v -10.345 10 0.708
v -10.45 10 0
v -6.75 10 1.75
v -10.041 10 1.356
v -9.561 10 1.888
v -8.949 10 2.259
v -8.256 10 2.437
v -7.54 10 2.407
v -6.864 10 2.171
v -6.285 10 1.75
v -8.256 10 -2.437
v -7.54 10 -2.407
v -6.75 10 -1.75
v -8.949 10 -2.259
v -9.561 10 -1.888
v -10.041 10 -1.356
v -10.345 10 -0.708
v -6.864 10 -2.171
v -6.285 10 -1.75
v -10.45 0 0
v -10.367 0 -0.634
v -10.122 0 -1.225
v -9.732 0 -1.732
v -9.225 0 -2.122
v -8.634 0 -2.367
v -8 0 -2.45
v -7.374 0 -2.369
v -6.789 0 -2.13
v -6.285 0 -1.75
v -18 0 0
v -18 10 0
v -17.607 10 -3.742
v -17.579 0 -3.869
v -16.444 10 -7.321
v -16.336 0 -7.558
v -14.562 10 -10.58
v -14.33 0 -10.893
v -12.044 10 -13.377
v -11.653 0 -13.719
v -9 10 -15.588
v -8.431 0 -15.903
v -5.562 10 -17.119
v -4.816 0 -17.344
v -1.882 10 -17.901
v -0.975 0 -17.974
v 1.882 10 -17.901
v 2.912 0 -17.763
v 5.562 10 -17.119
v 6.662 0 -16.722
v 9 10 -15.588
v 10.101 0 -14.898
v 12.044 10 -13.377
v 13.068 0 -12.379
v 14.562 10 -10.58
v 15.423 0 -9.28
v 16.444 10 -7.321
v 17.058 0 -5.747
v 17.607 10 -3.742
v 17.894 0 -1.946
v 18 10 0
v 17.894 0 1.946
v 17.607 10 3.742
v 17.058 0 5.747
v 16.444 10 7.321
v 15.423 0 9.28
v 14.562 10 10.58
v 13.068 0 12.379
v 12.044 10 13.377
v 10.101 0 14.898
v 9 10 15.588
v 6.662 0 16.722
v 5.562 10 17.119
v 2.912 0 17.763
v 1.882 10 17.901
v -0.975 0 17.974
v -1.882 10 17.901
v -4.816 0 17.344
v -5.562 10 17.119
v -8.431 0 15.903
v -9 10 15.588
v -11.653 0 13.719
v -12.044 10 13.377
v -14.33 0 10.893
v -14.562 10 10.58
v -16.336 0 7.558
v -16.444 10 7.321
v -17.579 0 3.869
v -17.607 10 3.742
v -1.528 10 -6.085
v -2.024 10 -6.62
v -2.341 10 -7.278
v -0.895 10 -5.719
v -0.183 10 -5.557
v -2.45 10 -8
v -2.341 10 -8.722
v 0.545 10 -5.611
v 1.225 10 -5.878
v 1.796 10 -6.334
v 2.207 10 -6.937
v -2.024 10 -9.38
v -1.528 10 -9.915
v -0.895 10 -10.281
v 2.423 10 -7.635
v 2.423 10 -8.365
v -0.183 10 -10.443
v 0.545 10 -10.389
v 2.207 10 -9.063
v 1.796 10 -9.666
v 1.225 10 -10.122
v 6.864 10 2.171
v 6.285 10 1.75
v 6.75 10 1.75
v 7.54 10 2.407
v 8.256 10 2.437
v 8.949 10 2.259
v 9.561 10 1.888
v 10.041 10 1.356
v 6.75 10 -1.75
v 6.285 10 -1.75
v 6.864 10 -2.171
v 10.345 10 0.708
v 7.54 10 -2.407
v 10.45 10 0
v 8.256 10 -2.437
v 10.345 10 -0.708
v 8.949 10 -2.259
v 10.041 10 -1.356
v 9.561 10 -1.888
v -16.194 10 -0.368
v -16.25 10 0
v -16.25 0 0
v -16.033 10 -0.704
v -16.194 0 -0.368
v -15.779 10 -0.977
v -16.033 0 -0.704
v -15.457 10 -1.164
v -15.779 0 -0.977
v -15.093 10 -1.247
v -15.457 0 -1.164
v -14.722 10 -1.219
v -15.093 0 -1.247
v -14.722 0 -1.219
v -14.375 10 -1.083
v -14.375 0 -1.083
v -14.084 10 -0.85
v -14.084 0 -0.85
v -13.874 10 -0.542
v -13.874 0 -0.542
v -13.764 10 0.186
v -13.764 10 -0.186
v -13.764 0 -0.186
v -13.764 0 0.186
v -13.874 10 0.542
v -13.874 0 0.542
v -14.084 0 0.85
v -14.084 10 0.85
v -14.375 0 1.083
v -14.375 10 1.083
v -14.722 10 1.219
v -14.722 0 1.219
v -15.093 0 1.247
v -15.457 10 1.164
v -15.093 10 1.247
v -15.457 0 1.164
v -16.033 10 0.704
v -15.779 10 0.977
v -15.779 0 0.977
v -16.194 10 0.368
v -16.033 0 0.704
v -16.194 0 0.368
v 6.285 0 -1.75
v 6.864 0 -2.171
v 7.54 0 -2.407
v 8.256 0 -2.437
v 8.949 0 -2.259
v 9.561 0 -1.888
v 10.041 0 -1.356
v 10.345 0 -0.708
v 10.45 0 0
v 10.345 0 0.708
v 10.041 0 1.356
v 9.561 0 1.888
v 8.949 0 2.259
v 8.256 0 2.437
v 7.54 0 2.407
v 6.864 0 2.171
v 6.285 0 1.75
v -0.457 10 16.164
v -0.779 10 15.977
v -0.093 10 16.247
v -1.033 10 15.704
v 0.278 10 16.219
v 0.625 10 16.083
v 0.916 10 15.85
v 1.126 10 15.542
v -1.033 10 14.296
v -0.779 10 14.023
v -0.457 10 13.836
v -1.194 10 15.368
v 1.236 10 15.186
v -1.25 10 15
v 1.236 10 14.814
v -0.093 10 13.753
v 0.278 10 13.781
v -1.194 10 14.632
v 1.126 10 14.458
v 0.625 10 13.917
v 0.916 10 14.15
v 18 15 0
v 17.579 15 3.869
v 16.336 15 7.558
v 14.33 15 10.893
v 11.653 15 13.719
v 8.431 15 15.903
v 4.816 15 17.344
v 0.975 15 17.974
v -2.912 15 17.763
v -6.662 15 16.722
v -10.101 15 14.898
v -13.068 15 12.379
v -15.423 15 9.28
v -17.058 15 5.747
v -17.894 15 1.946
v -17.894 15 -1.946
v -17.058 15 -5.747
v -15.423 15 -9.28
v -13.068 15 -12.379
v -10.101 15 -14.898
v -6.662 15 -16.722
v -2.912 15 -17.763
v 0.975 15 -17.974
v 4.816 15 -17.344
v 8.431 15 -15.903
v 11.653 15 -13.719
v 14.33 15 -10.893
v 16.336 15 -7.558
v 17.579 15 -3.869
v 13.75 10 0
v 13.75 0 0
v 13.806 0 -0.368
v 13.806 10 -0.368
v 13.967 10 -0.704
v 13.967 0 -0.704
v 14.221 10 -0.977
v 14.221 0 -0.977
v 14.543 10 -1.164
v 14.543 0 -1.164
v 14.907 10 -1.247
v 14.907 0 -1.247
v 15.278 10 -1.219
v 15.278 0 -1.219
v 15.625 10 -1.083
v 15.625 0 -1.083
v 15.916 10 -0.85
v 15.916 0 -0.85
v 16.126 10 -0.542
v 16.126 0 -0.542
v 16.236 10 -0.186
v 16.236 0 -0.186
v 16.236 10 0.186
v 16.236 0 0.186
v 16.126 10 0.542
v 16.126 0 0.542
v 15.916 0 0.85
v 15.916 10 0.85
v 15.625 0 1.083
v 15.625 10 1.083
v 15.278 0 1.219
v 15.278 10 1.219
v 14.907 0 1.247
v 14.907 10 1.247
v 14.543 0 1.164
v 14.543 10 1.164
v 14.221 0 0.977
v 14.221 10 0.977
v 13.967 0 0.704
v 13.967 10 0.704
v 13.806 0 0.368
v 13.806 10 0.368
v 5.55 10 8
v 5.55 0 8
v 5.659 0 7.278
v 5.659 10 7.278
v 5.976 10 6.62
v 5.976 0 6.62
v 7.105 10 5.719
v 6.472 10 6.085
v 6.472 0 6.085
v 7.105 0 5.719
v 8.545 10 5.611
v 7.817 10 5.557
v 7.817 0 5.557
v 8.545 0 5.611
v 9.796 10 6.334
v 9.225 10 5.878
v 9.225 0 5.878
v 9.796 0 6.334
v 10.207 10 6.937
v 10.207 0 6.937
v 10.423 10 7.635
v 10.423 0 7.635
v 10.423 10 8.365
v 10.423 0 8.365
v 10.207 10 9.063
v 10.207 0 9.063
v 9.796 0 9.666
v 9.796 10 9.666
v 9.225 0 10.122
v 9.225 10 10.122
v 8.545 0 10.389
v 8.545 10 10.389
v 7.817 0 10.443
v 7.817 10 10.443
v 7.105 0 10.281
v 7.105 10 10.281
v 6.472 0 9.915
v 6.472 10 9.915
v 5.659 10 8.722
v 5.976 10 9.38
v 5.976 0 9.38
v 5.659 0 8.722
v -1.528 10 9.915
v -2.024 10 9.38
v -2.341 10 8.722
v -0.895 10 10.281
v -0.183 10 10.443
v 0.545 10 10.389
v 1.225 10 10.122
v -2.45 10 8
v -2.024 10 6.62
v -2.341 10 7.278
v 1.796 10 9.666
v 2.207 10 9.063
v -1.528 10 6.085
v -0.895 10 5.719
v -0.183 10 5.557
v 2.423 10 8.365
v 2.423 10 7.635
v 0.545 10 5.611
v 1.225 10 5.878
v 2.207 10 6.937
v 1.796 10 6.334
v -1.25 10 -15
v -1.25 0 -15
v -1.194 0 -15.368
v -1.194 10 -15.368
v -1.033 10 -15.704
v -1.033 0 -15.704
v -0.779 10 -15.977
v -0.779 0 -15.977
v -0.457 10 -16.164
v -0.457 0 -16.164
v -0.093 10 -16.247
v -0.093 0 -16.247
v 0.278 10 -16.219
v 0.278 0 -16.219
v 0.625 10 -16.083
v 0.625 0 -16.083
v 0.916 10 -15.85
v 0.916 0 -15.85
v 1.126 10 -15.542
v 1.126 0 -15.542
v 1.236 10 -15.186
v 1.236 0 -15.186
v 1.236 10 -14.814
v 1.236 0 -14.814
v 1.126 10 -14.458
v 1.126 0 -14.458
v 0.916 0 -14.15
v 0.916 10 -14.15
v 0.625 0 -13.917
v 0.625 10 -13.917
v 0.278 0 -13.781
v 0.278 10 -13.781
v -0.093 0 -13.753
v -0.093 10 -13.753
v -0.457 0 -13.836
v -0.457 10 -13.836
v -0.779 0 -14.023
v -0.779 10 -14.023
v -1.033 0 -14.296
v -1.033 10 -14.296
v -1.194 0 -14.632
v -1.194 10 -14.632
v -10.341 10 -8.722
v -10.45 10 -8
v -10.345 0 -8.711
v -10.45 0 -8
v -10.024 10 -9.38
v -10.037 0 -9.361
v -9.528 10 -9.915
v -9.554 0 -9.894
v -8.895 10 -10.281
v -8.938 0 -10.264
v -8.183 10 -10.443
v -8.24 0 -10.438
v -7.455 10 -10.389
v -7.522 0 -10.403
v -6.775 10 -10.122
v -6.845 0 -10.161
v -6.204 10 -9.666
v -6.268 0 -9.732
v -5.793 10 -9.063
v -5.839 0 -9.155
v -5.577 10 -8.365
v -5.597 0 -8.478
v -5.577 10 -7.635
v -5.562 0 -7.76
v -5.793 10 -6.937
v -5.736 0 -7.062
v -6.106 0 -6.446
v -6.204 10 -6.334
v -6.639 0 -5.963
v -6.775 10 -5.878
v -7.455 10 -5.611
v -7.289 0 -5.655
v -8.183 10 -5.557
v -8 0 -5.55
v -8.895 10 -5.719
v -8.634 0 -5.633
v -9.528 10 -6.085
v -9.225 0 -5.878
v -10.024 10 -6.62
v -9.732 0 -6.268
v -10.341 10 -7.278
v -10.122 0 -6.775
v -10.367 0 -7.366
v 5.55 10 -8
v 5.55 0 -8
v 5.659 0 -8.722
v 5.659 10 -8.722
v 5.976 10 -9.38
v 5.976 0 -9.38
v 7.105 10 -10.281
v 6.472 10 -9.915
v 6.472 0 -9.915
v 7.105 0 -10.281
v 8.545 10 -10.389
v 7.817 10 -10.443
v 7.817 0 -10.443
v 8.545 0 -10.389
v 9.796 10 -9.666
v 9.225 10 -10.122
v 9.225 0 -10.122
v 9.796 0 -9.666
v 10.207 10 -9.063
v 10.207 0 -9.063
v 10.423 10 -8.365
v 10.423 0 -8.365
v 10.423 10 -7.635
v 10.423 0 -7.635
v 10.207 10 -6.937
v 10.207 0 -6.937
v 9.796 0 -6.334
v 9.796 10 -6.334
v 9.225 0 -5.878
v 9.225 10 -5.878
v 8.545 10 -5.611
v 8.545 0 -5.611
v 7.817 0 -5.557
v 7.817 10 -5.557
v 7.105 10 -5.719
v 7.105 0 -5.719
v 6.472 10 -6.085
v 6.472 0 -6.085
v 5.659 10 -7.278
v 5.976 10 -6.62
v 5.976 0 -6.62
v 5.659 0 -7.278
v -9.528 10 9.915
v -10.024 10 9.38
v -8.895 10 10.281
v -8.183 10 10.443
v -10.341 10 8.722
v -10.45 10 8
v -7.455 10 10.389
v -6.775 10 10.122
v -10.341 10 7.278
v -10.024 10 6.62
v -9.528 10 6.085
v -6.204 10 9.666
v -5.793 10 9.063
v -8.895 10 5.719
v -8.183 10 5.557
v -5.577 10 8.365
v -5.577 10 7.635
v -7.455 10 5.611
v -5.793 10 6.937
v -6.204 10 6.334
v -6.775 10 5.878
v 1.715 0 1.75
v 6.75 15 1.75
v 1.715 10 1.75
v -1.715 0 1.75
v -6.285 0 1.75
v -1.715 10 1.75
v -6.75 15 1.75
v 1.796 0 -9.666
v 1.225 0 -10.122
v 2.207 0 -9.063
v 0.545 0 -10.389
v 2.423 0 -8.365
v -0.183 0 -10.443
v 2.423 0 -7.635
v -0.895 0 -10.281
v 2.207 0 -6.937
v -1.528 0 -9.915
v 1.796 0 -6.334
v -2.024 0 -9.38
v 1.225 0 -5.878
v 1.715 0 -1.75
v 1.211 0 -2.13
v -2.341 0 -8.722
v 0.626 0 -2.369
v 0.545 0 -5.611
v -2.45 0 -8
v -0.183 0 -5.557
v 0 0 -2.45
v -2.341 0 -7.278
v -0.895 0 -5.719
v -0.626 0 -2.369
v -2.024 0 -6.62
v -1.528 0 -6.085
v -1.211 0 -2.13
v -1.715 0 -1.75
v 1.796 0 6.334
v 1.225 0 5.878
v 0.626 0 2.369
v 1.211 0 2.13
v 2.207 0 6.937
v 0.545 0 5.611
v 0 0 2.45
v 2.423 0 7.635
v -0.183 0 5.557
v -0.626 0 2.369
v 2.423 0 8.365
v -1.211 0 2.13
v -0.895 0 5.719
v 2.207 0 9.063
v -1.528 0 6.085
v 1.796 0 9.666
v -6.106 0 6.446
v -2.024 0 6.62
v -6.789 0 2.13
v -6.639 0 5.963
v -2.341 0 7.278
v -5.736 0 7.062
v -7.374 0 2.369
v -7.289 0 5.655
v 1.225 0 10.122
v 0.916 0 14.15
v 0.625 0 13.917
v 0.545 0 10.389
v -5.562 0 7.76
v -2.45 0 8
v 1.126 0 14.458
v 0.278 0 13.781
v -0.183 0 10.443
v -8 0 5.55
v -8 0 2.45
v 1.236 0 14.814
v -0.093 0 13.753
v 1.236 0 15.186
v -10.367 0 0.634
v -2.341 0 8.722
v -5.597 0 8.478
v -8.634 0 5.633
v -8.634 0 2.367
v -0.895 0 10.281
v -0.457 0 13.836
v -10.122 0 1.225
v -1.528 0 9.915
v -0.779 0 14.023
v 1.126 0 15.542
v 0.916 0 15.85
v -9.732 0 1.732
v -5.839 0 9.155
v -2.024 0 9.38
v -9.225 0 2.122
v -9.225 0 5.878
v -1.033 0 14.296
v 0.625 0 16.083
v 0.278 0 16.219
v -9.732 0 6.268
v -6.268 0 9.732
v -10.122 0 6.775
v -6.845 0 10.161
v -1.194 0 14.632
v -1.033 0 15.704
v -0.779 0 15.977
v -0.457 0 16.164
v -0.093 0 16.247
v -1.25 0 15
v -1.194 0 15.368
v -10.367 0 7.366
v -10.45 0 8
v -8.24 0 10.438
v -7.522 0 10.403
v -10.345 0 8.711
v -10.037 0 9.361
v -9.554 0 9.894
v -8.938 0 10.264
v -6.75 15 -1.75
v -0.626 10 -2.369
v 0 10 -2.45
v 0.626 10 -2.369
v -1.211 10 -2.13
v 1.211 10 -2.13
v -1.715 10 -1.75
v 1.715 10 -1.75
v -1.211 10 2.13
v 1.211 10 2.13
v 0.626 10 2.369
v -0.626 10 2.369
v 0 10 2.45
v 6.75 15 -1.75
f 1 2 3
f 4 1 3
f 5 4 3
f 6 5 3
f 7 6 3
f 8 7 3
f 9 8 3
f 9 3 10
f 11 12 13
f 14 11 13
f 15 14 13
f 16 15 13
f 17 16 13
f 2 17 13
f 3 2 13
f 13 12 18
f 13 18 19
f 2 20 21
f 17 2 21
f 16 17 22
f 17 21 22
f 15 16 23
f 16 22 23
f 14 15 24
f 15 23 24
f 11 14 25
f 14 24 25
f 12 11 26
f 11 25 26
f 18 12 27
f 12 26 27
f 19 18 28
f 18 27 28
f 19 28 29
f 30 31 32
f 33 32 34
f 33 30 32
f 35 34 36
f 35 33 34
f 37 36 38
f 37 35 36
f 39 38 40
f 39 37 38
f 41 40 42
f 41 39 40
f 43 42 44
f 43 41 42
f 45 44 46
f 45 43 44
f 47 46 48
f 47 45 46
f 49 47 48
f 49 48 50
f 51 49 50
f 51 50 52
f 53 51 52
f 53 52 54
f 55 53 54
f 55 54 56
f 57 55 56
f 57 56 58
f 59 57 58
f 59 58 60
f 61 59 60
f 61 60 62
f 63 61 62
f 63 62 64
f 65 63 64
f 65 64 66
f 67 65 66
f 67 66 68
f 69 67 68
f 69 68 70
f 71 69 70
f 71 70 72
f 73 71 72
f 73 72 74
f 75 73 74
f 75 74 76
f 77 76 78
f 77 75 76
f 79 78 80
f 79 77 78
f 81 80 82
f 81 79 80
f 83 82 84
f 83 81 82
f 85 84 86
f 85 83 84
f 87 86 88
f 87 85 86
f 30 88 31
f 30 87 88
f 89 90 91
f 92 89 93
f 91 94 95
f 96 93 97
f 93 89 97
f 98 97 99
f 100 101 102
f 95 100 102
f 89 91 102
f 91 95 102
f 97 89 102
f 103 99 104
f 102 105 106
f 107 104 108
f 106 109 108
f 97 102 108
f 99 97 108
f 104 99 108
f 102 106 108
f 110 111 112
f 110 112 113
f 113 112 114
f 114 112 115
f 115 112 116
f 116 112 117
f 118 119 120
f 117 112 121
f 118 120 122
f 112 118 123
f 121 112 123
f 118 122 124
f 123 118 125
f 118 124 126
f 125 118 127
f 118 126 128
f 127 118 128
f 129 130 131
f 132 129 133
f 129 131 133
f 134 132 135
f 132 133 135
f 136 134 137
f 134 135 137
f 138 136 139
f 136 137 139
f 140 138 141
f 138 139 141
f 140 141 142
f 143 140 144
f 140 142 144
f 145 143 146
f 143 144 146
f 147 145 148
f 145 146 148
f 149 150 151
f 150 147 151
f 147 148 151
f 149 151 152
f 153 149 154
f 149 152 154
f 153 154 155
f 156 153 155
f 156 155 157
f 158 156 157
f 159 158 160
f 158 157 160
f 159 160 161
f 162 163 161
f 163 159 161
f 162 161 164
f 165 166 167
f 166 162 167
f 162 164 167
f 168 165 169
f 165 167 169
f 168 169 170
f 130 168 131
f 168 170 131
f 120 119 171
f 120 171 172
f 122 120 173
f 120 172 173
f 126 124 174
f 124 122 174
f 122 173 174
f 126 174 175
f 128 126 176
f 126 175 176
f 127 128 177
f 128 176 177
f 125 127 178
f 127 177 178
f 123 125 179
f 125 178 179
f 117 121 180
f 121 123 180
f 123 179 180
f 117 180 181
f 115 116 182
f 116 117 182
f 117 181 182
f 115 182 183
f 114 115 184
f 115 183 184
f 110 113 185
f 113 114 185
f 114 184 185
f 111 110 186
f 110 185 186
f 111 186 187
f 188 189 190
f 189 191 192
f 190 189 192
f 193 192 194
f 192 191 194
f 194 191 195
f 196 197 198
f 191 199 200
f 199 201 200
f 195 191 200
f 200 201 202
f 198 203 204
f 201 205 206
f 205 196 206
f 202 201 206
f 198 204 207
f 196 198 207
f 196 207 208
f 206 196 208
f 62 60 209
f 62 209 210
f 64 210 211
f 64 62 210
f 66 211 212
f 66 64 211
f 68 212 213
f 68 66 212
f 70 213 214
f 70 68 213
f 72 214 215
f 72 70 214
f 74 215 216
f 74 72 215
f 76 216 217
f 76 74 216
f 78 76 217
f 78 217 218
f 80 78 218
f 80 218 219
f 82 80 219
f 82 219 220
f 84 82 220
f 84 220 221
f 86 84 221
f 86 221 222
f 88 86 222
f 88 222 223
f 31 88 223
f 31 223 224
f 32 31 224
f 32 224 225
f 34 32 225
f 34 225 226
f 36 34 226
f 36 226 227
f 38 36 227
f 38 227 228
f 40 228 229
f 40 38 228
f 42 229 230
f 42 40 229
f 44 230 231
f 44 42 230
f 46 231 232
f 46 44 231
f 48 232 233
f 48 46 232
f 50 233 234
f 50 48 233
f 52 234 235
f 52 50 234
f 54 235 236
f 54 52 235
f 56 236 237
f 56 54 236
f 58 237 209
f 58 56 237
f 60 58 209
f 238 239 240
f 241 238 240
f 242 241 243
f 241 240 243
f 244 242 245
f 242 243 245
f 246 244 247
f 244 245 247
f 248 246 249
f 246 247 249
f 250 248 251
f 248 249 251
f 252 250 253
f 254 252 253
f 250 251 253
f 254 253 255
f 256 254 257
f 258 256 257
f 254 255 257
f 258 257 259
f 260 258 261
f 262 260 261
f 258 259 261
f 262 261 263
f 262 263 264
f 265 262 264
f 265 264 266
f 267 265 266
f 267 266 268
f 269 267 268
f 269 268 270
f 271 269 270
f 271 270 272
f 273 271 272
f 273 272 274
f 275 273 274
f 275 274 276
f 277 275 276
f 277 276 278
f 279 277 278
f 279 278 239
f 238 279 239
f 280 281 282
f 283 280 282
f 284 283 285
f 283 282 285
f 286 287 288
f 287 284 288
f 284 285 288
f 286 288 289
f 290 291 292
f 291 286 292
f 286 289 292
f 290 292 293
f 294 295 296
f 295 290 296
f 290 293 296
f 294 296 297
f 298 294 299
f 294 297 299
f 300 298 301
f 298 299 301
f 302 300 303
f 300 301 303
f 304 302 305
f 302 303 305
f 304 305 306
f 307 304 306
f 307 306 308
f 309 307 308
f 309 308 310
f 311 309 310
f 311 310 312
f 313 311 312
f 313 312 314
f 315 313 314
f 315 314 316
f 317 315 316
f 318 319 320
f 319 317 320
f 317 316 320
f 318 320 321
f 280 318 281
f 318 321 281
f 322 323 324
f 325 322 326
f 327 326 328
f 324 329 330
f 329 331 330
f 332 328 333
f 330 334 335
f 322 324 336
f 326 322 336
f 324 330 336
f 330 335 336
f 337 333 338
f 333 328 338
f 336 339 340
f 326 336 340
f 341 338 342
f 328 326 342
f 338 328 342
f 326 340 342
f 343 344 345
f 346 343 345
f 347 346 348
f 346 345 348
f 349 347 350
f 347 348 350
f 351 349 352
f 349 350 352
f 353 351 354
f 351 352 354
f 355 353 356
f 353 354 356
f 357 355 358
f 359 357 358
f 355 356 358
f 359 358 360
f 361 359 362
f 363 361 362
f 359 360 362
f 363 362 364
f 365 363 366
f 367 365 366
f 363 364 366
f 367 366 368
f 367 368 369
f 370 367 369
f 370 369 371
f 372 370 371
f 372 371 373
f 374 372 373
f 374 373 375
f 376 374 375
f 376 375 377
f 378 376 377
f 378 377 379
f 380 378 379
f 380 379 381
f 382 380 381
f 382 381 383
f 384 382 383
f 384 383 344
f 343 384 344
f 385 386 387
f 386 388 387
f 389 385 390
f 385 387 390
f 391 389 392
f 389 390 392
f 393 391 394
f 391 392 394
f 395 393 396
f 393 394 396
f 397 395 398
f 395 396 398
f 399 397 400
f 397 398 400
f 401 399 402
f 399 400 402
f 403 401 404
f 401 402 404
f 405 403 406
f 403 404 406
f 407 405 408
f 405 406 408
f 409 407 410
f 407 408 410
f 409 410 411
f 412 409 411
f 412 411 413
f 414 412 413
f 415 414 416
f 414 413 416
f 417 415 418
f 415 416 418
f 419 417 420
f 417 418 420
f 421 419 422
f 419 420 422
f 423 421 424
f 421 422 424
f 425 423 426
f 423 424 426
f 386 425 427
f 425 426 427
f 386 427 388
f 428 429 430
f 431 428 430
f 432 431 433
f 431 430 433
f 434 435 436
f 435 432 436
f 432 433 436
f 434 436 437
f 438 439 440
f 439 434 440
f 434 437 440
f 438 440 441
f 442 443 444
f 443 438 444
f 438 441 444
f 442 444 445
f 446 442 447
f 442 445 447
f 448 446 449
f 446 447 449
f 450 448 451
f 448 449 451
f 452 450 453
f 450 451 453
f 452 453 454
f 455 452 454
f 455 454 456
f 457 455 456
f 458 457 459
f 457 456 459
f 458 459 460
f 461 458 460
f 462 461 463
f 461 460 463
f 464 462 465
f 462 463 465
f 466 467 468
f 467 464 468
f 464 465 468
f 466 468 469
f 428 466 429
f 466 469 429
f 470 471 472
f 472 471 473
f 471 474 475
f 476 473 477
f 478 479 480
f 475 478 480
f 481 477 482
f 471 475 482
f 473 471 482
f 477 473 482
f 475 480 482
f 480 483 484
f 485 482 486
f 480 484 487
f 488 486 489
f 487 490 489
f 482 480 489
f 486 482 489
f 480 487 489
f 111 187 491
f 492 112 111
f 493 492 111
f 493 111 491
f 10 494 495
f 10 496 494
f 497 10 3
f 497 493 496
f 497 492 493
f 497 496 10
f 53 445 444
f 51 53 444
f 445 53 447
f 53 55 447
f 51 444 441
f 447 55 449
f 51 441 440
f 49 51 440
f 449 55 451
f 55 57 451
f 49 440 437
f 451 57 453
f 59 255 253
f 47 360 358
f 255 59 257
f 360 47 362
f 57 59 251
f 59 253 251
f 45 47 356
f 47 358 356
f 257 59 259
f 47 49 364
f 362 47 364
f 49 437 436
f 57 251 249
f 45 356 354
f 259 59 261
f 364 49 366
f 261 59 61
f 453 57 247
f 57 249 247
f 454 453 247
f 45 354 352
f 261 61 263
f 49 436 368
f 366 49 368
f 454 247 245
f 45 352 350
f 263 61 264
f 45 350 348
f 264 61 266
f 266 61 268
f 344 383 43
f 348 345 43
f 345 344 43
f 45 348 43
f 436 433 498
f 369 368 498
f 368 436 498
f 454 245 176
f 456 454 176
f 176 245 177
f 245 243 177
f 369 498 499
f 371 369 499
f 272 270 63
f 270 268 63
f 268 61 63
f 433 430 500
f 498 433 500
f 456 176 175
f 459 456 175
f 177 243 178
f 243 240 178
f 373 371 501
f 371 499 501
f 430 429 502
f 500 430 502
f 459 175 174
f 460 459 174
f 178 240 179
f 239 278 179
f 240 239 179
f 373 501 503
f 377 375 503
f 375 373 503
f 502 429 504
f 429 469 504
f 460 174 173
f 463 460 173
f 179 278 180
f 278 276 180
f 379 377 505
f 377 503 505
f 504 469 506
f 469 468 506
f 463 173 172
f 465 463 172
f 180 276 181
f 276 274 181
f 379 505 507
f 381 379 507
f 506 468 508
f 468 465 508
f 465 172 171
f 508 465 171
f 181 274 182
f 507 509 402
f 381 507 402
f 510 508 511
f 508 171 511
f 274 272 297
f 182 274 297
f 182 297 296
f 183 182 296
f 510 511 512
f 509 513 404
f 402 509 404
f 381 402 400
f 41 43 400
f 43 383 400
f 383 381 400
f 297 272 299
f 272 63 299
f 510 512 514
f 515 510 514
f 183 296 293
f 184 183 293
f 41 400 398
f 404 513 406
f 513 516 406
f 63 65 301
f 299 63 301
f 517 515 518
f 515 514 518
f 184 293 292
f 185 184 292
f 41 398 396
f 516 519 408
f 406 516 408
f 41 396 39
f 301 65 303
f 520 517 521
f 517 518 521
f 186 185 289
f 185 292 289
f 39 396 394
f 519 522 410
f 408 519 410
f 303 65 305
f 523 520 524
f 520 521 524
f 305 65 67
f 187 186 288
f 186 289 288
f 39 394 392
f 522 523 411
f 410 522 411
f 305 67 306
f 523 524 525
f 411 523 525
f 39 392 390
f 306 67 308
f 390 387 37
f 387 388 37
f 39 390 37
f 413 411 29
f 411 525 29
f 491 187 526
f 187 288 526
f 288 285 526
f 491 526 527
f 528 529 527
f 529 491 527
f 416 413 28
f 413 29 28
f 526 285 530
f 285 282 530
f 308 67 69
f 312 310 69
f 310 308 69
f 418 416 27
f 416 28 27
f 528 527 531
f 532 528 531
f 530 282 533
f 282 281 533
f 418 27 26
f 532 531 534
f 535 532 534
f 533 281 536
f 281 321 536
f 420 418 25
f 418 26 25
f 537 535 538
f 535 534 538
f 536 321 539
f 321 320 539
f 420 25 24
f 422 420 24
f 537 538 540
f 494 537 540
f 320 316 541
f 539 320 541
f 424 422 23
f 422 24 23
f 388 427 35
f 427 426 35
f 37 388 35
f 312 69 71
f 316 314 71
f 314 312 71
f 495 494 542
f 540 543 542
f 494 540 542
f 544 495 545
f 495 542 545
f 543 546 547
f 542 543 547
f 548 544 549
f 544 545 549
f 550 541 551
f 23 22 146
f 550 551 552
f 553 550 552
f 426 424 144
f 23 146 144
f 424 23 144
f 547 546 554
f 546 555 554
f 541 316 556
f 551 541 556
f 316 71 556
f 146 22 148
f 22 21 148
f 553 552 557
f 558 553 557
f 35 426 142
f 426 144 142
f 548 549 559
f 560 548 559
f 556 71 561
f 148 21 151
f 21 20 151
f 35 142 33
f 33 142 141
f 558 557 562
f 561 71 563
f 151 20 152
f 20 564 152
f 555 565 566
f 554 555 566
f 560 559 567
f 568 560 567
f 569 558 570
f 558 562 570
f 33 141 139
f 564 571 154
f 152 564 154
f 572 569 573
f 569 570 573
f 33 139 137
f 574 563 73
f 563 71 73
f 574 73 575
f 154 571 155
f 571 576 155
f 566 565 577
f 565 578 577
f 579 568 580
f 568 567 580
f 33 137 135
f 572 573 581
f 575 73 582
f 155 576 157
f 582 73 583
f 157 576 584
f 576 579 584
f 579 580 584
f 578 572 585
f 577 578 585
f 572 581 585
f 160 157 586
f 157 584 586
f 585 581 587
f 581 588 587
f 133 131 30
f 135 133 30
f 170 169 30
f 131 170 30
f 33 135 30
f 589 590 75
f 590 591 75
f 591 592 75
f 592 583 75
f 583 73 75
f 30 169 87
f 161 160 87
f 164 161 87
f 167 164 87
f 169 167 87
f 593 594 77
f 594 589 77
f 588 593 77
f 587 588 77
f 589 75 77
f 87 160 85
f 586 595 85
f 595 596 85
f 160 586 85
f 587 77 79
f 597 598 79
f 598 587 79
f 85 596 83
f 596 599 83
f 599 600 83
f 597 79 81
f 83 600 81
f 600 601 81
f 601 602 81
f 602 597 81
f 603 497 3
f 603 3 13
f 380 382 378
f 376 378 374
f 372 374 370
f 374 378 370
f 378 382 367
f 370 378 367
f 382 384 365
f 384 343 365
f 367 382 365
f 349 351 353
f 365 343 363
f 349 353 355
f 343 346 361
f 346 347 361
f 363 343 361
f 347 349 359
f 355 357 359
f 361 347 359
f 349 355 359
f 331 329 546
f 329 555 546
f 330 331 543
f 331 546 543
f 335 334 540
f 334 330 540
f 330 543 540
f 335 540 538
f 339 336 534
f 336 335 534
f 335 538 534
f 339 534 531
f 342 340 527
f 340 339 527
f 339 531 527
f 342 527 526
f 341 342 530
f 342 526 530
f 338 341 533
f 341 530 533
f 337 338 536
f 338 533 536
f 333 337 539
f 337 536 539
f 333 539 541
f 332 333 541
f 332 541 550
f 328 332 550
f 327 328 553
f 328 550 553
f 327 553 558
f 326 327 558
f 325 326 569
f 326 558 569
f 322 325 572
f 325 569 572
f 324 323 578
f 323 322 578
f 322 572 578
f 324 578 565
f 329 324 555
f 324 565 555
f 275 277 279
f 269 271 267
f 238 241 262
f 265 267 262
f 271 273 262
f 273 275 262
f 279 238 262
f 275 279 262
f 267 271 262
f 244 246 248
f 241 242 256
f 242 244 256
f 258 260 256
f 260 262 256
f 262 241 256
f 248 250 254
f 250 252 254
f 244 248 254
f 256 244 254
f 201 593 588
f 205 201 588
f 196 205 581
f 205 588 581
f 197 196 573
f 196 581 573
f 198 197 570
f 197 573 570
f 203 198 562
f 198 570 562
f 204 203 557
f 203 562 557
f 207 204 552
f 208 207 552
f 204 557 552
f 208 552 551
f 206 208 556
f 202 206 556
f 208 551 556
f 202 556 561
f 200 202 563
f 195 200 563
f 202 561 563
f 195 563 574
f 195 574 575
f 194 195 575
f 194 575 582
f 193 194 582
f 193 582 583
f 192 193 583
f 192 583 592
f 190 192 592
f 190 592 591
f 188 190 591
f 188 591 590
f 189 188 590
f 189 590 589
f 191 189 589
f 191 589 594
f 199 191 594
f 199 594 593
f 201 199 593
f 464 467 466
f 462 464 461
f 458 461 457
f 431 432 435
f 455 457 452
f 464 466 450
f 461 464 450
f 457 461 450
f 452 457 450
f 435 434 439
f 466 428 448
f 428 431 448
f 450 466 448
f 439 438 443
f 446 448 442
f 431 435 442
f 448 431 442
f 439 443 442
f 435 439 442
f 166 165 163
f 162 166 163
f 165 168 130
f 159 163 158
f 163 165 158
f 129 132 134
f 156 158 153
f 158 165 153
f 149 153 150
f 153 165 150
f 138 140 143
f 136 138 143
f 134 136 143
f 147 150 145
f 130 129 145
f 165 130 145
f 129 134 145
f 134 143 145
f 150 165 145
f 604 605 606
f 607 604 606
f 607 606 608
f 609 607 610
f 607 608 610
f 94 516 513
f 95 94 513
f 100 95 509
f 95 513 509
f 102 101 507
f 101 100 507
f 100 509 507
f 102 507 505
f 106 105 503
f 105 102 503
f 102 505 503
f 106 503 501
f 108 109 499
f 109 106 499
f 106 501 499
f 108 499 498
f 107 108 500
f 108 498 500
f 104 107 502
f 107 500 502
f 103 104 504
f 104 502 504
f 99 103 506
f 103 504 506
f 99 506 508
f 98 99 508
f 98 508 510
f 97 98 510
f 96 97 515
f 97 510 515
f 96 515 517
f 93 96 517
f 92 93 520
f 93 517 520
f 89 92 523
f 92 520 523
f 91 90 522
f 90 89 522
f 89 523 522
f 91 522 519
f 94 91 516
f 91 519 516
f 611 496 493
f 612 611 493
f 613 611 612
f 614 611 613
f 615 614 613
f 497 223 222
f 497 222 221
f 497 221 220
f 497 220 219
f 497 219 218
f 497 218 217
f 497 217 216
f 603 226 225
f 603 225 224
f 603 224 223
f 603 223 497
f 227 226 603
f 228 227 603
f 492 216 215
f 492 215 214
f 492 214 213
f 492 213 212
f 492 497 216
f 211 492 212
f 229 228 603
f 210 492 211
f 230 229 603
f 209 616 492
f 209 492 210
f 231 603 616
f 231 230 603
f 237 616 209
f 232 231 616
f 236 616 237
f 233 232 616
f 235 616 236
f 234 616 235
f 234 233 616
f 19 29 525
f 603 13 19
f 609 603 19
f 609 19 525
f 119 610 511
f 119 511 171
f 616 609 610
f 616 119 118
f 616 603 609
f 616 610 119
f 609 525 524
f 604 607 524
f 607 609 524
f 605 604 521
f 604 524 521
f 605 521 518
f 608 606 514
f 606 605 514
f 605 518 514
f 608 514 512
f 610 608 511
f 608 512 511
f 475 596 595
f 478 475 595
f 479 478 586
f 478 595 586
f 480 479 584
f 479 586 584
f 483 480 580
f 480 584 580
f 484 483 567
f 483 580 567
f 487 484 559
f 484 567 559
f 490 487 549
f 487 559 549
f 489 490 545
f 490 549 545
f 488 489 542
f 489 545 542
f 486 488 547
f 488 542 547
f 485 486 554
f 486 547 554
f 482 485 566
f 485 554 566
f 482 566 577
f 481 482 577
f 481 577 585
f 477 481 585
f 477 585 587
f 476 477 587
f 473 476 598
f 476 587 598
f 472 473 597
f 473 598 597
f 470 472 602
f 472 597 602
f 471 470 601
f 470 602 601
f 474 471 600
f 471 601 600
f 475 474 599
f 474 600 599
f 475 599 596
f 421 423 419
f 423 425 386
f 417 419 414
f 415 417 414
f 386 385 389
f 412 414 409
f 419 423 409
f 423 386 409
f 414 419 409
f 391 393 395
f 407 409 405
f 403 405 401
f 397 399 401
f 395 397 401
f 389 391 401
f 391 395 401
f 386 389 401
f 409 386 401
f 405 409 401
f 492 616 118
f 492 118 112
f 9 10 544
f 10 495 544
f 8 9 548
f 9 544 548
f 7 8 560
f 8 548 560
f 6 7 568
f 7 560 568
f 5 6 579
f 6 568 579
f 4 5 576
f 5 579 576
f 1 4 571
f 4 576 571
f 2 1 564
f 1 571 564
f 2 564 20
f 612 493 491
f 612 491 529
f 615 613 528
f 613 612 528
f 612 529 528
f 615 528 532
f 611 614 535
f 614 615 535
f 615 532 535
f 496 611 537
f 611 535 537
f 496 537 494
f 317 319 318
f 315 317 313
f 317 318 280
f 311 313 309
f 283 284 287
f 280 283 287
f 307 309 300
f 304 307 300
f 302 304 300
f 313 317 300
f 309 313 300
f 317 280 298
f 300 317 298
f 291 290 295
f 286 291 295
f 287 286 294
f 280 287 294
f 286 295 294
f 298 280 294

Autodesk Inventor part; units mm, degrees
ref_plane "YZ Plane" through (0, 0, 0) normal (1, 0, 0) x (0, 1, 0)
ref_plane "XZ Plane" through (0, 0, 0) normal (0, 1, 0) x (-1, 0, 0)
ref_plane "XY Plane" through (0, 0, 0) normal (0, 0, 1) x (1, 0, 0)
sketch "Sketch1" plane through (0, 0, 0) normal (0, 1, 0) x (-1, 0, 0)
  circle A0 centre (0, 0) radius 15
  circle A1 centre (0, 0) radius 2.45
  line L0 (0, 0) -> (8, 0)
  circle A2 centre (8, 0) radius 2.45
  line L1 (8, 0) -> (8, -8)
  line L2 (8, 0) -> (8, 8)
  circle A3 centre (8, 8) radius 2.45
  circle A4 centre (8, -8) radius 2.45
  circle A5 centre (0, 8) radius 2.45
  circle A6 centre (0, -8) radius 2.45
  line L3 (0, 0) -> (-8, 0)
  line L4 (0, 0) -> (8, 0) construction
  circle A7 centre (-8, 0) radius 2.45
  circle A8 centre (-8, -8) radius 2.45
  circle A9 centre (-8, 8) radius 2.45
  circle A10 centre (0, -15) radius 1.25
  circle A11 centre (-15, 0) radius 1.25
  circle A12 centre (0, 15) radius 1.25
  circle A13 centre (15, 0) radius 1.25
  circle A14 centre (0, 0) radius 18
  dimension "d0" = 30
  dimension "d1" = 4.9
  dimension "d2" = 8
  dimension "d3" = 4.9
  dimension "d4" = 8
  dimension "d5" = 8
  dimension "d6" = 4.9
  dimension "d7" = 4.9
  dimension "d8" = 4.9
  dimension "d9" = 4.9
  dimension "d10" = 8
  dimension "d11" = 180
  dimension "d12" = 4.9
  dimension "d13" = 4.9
  dimension "d14" = 4.9
  dimension "d15" = 2.5
  dimension "d16" = 2.5
  dimension "d17" = 2.5
  dimension "d18" = 2.5
  dimension "d19" = 36
extrude "Extrusion1" add sketch "Sketch1" along normal blind 10 contours A13 A0 A10 A11 A12 | A14
sketch "Sketch2" plane through (0, 10, 0) normal (0, 1, 0) x (1, 0, 0)
  circle A0 centre (0, 0) radius 18
  dimension "d24" = 36
extrude "Extrusion2" add sketch "Sketch2" along normal blind 5
sketch "Sketch3" plane through (0, 15, 0) normal (0, 1, 0) x (1, 0, 0)
  point P0 (0, 0)
sketch "Sketch4" plane through (0, 15, 0) normal (0, 1, 0) x (1, 0, 0)
  line L0 (-6.75, 1.75) -> (6.75, 1.75)
  line L1 (6.75, 1.75) -> (6.75, -1.75)
  line L2 (6.75, -1.75) -> (-6.75, -1.75)
  line L3 (-6.75, -1.75) -> (-6.75, 1.75)
  line L4 (-6.75, 1.75) -> (6.75, -1.75) construction
  line L5 (6.75, 1.75) -> (-6.75, -1.75) construction
  point P0 (0, 0)
  dimension "d25" = 13.5
  dimension "d26" = 3.5
extrude "Extrusion3" cut sketch "Sketch4" against normal blind 15
properties part number "Sendok 1"
